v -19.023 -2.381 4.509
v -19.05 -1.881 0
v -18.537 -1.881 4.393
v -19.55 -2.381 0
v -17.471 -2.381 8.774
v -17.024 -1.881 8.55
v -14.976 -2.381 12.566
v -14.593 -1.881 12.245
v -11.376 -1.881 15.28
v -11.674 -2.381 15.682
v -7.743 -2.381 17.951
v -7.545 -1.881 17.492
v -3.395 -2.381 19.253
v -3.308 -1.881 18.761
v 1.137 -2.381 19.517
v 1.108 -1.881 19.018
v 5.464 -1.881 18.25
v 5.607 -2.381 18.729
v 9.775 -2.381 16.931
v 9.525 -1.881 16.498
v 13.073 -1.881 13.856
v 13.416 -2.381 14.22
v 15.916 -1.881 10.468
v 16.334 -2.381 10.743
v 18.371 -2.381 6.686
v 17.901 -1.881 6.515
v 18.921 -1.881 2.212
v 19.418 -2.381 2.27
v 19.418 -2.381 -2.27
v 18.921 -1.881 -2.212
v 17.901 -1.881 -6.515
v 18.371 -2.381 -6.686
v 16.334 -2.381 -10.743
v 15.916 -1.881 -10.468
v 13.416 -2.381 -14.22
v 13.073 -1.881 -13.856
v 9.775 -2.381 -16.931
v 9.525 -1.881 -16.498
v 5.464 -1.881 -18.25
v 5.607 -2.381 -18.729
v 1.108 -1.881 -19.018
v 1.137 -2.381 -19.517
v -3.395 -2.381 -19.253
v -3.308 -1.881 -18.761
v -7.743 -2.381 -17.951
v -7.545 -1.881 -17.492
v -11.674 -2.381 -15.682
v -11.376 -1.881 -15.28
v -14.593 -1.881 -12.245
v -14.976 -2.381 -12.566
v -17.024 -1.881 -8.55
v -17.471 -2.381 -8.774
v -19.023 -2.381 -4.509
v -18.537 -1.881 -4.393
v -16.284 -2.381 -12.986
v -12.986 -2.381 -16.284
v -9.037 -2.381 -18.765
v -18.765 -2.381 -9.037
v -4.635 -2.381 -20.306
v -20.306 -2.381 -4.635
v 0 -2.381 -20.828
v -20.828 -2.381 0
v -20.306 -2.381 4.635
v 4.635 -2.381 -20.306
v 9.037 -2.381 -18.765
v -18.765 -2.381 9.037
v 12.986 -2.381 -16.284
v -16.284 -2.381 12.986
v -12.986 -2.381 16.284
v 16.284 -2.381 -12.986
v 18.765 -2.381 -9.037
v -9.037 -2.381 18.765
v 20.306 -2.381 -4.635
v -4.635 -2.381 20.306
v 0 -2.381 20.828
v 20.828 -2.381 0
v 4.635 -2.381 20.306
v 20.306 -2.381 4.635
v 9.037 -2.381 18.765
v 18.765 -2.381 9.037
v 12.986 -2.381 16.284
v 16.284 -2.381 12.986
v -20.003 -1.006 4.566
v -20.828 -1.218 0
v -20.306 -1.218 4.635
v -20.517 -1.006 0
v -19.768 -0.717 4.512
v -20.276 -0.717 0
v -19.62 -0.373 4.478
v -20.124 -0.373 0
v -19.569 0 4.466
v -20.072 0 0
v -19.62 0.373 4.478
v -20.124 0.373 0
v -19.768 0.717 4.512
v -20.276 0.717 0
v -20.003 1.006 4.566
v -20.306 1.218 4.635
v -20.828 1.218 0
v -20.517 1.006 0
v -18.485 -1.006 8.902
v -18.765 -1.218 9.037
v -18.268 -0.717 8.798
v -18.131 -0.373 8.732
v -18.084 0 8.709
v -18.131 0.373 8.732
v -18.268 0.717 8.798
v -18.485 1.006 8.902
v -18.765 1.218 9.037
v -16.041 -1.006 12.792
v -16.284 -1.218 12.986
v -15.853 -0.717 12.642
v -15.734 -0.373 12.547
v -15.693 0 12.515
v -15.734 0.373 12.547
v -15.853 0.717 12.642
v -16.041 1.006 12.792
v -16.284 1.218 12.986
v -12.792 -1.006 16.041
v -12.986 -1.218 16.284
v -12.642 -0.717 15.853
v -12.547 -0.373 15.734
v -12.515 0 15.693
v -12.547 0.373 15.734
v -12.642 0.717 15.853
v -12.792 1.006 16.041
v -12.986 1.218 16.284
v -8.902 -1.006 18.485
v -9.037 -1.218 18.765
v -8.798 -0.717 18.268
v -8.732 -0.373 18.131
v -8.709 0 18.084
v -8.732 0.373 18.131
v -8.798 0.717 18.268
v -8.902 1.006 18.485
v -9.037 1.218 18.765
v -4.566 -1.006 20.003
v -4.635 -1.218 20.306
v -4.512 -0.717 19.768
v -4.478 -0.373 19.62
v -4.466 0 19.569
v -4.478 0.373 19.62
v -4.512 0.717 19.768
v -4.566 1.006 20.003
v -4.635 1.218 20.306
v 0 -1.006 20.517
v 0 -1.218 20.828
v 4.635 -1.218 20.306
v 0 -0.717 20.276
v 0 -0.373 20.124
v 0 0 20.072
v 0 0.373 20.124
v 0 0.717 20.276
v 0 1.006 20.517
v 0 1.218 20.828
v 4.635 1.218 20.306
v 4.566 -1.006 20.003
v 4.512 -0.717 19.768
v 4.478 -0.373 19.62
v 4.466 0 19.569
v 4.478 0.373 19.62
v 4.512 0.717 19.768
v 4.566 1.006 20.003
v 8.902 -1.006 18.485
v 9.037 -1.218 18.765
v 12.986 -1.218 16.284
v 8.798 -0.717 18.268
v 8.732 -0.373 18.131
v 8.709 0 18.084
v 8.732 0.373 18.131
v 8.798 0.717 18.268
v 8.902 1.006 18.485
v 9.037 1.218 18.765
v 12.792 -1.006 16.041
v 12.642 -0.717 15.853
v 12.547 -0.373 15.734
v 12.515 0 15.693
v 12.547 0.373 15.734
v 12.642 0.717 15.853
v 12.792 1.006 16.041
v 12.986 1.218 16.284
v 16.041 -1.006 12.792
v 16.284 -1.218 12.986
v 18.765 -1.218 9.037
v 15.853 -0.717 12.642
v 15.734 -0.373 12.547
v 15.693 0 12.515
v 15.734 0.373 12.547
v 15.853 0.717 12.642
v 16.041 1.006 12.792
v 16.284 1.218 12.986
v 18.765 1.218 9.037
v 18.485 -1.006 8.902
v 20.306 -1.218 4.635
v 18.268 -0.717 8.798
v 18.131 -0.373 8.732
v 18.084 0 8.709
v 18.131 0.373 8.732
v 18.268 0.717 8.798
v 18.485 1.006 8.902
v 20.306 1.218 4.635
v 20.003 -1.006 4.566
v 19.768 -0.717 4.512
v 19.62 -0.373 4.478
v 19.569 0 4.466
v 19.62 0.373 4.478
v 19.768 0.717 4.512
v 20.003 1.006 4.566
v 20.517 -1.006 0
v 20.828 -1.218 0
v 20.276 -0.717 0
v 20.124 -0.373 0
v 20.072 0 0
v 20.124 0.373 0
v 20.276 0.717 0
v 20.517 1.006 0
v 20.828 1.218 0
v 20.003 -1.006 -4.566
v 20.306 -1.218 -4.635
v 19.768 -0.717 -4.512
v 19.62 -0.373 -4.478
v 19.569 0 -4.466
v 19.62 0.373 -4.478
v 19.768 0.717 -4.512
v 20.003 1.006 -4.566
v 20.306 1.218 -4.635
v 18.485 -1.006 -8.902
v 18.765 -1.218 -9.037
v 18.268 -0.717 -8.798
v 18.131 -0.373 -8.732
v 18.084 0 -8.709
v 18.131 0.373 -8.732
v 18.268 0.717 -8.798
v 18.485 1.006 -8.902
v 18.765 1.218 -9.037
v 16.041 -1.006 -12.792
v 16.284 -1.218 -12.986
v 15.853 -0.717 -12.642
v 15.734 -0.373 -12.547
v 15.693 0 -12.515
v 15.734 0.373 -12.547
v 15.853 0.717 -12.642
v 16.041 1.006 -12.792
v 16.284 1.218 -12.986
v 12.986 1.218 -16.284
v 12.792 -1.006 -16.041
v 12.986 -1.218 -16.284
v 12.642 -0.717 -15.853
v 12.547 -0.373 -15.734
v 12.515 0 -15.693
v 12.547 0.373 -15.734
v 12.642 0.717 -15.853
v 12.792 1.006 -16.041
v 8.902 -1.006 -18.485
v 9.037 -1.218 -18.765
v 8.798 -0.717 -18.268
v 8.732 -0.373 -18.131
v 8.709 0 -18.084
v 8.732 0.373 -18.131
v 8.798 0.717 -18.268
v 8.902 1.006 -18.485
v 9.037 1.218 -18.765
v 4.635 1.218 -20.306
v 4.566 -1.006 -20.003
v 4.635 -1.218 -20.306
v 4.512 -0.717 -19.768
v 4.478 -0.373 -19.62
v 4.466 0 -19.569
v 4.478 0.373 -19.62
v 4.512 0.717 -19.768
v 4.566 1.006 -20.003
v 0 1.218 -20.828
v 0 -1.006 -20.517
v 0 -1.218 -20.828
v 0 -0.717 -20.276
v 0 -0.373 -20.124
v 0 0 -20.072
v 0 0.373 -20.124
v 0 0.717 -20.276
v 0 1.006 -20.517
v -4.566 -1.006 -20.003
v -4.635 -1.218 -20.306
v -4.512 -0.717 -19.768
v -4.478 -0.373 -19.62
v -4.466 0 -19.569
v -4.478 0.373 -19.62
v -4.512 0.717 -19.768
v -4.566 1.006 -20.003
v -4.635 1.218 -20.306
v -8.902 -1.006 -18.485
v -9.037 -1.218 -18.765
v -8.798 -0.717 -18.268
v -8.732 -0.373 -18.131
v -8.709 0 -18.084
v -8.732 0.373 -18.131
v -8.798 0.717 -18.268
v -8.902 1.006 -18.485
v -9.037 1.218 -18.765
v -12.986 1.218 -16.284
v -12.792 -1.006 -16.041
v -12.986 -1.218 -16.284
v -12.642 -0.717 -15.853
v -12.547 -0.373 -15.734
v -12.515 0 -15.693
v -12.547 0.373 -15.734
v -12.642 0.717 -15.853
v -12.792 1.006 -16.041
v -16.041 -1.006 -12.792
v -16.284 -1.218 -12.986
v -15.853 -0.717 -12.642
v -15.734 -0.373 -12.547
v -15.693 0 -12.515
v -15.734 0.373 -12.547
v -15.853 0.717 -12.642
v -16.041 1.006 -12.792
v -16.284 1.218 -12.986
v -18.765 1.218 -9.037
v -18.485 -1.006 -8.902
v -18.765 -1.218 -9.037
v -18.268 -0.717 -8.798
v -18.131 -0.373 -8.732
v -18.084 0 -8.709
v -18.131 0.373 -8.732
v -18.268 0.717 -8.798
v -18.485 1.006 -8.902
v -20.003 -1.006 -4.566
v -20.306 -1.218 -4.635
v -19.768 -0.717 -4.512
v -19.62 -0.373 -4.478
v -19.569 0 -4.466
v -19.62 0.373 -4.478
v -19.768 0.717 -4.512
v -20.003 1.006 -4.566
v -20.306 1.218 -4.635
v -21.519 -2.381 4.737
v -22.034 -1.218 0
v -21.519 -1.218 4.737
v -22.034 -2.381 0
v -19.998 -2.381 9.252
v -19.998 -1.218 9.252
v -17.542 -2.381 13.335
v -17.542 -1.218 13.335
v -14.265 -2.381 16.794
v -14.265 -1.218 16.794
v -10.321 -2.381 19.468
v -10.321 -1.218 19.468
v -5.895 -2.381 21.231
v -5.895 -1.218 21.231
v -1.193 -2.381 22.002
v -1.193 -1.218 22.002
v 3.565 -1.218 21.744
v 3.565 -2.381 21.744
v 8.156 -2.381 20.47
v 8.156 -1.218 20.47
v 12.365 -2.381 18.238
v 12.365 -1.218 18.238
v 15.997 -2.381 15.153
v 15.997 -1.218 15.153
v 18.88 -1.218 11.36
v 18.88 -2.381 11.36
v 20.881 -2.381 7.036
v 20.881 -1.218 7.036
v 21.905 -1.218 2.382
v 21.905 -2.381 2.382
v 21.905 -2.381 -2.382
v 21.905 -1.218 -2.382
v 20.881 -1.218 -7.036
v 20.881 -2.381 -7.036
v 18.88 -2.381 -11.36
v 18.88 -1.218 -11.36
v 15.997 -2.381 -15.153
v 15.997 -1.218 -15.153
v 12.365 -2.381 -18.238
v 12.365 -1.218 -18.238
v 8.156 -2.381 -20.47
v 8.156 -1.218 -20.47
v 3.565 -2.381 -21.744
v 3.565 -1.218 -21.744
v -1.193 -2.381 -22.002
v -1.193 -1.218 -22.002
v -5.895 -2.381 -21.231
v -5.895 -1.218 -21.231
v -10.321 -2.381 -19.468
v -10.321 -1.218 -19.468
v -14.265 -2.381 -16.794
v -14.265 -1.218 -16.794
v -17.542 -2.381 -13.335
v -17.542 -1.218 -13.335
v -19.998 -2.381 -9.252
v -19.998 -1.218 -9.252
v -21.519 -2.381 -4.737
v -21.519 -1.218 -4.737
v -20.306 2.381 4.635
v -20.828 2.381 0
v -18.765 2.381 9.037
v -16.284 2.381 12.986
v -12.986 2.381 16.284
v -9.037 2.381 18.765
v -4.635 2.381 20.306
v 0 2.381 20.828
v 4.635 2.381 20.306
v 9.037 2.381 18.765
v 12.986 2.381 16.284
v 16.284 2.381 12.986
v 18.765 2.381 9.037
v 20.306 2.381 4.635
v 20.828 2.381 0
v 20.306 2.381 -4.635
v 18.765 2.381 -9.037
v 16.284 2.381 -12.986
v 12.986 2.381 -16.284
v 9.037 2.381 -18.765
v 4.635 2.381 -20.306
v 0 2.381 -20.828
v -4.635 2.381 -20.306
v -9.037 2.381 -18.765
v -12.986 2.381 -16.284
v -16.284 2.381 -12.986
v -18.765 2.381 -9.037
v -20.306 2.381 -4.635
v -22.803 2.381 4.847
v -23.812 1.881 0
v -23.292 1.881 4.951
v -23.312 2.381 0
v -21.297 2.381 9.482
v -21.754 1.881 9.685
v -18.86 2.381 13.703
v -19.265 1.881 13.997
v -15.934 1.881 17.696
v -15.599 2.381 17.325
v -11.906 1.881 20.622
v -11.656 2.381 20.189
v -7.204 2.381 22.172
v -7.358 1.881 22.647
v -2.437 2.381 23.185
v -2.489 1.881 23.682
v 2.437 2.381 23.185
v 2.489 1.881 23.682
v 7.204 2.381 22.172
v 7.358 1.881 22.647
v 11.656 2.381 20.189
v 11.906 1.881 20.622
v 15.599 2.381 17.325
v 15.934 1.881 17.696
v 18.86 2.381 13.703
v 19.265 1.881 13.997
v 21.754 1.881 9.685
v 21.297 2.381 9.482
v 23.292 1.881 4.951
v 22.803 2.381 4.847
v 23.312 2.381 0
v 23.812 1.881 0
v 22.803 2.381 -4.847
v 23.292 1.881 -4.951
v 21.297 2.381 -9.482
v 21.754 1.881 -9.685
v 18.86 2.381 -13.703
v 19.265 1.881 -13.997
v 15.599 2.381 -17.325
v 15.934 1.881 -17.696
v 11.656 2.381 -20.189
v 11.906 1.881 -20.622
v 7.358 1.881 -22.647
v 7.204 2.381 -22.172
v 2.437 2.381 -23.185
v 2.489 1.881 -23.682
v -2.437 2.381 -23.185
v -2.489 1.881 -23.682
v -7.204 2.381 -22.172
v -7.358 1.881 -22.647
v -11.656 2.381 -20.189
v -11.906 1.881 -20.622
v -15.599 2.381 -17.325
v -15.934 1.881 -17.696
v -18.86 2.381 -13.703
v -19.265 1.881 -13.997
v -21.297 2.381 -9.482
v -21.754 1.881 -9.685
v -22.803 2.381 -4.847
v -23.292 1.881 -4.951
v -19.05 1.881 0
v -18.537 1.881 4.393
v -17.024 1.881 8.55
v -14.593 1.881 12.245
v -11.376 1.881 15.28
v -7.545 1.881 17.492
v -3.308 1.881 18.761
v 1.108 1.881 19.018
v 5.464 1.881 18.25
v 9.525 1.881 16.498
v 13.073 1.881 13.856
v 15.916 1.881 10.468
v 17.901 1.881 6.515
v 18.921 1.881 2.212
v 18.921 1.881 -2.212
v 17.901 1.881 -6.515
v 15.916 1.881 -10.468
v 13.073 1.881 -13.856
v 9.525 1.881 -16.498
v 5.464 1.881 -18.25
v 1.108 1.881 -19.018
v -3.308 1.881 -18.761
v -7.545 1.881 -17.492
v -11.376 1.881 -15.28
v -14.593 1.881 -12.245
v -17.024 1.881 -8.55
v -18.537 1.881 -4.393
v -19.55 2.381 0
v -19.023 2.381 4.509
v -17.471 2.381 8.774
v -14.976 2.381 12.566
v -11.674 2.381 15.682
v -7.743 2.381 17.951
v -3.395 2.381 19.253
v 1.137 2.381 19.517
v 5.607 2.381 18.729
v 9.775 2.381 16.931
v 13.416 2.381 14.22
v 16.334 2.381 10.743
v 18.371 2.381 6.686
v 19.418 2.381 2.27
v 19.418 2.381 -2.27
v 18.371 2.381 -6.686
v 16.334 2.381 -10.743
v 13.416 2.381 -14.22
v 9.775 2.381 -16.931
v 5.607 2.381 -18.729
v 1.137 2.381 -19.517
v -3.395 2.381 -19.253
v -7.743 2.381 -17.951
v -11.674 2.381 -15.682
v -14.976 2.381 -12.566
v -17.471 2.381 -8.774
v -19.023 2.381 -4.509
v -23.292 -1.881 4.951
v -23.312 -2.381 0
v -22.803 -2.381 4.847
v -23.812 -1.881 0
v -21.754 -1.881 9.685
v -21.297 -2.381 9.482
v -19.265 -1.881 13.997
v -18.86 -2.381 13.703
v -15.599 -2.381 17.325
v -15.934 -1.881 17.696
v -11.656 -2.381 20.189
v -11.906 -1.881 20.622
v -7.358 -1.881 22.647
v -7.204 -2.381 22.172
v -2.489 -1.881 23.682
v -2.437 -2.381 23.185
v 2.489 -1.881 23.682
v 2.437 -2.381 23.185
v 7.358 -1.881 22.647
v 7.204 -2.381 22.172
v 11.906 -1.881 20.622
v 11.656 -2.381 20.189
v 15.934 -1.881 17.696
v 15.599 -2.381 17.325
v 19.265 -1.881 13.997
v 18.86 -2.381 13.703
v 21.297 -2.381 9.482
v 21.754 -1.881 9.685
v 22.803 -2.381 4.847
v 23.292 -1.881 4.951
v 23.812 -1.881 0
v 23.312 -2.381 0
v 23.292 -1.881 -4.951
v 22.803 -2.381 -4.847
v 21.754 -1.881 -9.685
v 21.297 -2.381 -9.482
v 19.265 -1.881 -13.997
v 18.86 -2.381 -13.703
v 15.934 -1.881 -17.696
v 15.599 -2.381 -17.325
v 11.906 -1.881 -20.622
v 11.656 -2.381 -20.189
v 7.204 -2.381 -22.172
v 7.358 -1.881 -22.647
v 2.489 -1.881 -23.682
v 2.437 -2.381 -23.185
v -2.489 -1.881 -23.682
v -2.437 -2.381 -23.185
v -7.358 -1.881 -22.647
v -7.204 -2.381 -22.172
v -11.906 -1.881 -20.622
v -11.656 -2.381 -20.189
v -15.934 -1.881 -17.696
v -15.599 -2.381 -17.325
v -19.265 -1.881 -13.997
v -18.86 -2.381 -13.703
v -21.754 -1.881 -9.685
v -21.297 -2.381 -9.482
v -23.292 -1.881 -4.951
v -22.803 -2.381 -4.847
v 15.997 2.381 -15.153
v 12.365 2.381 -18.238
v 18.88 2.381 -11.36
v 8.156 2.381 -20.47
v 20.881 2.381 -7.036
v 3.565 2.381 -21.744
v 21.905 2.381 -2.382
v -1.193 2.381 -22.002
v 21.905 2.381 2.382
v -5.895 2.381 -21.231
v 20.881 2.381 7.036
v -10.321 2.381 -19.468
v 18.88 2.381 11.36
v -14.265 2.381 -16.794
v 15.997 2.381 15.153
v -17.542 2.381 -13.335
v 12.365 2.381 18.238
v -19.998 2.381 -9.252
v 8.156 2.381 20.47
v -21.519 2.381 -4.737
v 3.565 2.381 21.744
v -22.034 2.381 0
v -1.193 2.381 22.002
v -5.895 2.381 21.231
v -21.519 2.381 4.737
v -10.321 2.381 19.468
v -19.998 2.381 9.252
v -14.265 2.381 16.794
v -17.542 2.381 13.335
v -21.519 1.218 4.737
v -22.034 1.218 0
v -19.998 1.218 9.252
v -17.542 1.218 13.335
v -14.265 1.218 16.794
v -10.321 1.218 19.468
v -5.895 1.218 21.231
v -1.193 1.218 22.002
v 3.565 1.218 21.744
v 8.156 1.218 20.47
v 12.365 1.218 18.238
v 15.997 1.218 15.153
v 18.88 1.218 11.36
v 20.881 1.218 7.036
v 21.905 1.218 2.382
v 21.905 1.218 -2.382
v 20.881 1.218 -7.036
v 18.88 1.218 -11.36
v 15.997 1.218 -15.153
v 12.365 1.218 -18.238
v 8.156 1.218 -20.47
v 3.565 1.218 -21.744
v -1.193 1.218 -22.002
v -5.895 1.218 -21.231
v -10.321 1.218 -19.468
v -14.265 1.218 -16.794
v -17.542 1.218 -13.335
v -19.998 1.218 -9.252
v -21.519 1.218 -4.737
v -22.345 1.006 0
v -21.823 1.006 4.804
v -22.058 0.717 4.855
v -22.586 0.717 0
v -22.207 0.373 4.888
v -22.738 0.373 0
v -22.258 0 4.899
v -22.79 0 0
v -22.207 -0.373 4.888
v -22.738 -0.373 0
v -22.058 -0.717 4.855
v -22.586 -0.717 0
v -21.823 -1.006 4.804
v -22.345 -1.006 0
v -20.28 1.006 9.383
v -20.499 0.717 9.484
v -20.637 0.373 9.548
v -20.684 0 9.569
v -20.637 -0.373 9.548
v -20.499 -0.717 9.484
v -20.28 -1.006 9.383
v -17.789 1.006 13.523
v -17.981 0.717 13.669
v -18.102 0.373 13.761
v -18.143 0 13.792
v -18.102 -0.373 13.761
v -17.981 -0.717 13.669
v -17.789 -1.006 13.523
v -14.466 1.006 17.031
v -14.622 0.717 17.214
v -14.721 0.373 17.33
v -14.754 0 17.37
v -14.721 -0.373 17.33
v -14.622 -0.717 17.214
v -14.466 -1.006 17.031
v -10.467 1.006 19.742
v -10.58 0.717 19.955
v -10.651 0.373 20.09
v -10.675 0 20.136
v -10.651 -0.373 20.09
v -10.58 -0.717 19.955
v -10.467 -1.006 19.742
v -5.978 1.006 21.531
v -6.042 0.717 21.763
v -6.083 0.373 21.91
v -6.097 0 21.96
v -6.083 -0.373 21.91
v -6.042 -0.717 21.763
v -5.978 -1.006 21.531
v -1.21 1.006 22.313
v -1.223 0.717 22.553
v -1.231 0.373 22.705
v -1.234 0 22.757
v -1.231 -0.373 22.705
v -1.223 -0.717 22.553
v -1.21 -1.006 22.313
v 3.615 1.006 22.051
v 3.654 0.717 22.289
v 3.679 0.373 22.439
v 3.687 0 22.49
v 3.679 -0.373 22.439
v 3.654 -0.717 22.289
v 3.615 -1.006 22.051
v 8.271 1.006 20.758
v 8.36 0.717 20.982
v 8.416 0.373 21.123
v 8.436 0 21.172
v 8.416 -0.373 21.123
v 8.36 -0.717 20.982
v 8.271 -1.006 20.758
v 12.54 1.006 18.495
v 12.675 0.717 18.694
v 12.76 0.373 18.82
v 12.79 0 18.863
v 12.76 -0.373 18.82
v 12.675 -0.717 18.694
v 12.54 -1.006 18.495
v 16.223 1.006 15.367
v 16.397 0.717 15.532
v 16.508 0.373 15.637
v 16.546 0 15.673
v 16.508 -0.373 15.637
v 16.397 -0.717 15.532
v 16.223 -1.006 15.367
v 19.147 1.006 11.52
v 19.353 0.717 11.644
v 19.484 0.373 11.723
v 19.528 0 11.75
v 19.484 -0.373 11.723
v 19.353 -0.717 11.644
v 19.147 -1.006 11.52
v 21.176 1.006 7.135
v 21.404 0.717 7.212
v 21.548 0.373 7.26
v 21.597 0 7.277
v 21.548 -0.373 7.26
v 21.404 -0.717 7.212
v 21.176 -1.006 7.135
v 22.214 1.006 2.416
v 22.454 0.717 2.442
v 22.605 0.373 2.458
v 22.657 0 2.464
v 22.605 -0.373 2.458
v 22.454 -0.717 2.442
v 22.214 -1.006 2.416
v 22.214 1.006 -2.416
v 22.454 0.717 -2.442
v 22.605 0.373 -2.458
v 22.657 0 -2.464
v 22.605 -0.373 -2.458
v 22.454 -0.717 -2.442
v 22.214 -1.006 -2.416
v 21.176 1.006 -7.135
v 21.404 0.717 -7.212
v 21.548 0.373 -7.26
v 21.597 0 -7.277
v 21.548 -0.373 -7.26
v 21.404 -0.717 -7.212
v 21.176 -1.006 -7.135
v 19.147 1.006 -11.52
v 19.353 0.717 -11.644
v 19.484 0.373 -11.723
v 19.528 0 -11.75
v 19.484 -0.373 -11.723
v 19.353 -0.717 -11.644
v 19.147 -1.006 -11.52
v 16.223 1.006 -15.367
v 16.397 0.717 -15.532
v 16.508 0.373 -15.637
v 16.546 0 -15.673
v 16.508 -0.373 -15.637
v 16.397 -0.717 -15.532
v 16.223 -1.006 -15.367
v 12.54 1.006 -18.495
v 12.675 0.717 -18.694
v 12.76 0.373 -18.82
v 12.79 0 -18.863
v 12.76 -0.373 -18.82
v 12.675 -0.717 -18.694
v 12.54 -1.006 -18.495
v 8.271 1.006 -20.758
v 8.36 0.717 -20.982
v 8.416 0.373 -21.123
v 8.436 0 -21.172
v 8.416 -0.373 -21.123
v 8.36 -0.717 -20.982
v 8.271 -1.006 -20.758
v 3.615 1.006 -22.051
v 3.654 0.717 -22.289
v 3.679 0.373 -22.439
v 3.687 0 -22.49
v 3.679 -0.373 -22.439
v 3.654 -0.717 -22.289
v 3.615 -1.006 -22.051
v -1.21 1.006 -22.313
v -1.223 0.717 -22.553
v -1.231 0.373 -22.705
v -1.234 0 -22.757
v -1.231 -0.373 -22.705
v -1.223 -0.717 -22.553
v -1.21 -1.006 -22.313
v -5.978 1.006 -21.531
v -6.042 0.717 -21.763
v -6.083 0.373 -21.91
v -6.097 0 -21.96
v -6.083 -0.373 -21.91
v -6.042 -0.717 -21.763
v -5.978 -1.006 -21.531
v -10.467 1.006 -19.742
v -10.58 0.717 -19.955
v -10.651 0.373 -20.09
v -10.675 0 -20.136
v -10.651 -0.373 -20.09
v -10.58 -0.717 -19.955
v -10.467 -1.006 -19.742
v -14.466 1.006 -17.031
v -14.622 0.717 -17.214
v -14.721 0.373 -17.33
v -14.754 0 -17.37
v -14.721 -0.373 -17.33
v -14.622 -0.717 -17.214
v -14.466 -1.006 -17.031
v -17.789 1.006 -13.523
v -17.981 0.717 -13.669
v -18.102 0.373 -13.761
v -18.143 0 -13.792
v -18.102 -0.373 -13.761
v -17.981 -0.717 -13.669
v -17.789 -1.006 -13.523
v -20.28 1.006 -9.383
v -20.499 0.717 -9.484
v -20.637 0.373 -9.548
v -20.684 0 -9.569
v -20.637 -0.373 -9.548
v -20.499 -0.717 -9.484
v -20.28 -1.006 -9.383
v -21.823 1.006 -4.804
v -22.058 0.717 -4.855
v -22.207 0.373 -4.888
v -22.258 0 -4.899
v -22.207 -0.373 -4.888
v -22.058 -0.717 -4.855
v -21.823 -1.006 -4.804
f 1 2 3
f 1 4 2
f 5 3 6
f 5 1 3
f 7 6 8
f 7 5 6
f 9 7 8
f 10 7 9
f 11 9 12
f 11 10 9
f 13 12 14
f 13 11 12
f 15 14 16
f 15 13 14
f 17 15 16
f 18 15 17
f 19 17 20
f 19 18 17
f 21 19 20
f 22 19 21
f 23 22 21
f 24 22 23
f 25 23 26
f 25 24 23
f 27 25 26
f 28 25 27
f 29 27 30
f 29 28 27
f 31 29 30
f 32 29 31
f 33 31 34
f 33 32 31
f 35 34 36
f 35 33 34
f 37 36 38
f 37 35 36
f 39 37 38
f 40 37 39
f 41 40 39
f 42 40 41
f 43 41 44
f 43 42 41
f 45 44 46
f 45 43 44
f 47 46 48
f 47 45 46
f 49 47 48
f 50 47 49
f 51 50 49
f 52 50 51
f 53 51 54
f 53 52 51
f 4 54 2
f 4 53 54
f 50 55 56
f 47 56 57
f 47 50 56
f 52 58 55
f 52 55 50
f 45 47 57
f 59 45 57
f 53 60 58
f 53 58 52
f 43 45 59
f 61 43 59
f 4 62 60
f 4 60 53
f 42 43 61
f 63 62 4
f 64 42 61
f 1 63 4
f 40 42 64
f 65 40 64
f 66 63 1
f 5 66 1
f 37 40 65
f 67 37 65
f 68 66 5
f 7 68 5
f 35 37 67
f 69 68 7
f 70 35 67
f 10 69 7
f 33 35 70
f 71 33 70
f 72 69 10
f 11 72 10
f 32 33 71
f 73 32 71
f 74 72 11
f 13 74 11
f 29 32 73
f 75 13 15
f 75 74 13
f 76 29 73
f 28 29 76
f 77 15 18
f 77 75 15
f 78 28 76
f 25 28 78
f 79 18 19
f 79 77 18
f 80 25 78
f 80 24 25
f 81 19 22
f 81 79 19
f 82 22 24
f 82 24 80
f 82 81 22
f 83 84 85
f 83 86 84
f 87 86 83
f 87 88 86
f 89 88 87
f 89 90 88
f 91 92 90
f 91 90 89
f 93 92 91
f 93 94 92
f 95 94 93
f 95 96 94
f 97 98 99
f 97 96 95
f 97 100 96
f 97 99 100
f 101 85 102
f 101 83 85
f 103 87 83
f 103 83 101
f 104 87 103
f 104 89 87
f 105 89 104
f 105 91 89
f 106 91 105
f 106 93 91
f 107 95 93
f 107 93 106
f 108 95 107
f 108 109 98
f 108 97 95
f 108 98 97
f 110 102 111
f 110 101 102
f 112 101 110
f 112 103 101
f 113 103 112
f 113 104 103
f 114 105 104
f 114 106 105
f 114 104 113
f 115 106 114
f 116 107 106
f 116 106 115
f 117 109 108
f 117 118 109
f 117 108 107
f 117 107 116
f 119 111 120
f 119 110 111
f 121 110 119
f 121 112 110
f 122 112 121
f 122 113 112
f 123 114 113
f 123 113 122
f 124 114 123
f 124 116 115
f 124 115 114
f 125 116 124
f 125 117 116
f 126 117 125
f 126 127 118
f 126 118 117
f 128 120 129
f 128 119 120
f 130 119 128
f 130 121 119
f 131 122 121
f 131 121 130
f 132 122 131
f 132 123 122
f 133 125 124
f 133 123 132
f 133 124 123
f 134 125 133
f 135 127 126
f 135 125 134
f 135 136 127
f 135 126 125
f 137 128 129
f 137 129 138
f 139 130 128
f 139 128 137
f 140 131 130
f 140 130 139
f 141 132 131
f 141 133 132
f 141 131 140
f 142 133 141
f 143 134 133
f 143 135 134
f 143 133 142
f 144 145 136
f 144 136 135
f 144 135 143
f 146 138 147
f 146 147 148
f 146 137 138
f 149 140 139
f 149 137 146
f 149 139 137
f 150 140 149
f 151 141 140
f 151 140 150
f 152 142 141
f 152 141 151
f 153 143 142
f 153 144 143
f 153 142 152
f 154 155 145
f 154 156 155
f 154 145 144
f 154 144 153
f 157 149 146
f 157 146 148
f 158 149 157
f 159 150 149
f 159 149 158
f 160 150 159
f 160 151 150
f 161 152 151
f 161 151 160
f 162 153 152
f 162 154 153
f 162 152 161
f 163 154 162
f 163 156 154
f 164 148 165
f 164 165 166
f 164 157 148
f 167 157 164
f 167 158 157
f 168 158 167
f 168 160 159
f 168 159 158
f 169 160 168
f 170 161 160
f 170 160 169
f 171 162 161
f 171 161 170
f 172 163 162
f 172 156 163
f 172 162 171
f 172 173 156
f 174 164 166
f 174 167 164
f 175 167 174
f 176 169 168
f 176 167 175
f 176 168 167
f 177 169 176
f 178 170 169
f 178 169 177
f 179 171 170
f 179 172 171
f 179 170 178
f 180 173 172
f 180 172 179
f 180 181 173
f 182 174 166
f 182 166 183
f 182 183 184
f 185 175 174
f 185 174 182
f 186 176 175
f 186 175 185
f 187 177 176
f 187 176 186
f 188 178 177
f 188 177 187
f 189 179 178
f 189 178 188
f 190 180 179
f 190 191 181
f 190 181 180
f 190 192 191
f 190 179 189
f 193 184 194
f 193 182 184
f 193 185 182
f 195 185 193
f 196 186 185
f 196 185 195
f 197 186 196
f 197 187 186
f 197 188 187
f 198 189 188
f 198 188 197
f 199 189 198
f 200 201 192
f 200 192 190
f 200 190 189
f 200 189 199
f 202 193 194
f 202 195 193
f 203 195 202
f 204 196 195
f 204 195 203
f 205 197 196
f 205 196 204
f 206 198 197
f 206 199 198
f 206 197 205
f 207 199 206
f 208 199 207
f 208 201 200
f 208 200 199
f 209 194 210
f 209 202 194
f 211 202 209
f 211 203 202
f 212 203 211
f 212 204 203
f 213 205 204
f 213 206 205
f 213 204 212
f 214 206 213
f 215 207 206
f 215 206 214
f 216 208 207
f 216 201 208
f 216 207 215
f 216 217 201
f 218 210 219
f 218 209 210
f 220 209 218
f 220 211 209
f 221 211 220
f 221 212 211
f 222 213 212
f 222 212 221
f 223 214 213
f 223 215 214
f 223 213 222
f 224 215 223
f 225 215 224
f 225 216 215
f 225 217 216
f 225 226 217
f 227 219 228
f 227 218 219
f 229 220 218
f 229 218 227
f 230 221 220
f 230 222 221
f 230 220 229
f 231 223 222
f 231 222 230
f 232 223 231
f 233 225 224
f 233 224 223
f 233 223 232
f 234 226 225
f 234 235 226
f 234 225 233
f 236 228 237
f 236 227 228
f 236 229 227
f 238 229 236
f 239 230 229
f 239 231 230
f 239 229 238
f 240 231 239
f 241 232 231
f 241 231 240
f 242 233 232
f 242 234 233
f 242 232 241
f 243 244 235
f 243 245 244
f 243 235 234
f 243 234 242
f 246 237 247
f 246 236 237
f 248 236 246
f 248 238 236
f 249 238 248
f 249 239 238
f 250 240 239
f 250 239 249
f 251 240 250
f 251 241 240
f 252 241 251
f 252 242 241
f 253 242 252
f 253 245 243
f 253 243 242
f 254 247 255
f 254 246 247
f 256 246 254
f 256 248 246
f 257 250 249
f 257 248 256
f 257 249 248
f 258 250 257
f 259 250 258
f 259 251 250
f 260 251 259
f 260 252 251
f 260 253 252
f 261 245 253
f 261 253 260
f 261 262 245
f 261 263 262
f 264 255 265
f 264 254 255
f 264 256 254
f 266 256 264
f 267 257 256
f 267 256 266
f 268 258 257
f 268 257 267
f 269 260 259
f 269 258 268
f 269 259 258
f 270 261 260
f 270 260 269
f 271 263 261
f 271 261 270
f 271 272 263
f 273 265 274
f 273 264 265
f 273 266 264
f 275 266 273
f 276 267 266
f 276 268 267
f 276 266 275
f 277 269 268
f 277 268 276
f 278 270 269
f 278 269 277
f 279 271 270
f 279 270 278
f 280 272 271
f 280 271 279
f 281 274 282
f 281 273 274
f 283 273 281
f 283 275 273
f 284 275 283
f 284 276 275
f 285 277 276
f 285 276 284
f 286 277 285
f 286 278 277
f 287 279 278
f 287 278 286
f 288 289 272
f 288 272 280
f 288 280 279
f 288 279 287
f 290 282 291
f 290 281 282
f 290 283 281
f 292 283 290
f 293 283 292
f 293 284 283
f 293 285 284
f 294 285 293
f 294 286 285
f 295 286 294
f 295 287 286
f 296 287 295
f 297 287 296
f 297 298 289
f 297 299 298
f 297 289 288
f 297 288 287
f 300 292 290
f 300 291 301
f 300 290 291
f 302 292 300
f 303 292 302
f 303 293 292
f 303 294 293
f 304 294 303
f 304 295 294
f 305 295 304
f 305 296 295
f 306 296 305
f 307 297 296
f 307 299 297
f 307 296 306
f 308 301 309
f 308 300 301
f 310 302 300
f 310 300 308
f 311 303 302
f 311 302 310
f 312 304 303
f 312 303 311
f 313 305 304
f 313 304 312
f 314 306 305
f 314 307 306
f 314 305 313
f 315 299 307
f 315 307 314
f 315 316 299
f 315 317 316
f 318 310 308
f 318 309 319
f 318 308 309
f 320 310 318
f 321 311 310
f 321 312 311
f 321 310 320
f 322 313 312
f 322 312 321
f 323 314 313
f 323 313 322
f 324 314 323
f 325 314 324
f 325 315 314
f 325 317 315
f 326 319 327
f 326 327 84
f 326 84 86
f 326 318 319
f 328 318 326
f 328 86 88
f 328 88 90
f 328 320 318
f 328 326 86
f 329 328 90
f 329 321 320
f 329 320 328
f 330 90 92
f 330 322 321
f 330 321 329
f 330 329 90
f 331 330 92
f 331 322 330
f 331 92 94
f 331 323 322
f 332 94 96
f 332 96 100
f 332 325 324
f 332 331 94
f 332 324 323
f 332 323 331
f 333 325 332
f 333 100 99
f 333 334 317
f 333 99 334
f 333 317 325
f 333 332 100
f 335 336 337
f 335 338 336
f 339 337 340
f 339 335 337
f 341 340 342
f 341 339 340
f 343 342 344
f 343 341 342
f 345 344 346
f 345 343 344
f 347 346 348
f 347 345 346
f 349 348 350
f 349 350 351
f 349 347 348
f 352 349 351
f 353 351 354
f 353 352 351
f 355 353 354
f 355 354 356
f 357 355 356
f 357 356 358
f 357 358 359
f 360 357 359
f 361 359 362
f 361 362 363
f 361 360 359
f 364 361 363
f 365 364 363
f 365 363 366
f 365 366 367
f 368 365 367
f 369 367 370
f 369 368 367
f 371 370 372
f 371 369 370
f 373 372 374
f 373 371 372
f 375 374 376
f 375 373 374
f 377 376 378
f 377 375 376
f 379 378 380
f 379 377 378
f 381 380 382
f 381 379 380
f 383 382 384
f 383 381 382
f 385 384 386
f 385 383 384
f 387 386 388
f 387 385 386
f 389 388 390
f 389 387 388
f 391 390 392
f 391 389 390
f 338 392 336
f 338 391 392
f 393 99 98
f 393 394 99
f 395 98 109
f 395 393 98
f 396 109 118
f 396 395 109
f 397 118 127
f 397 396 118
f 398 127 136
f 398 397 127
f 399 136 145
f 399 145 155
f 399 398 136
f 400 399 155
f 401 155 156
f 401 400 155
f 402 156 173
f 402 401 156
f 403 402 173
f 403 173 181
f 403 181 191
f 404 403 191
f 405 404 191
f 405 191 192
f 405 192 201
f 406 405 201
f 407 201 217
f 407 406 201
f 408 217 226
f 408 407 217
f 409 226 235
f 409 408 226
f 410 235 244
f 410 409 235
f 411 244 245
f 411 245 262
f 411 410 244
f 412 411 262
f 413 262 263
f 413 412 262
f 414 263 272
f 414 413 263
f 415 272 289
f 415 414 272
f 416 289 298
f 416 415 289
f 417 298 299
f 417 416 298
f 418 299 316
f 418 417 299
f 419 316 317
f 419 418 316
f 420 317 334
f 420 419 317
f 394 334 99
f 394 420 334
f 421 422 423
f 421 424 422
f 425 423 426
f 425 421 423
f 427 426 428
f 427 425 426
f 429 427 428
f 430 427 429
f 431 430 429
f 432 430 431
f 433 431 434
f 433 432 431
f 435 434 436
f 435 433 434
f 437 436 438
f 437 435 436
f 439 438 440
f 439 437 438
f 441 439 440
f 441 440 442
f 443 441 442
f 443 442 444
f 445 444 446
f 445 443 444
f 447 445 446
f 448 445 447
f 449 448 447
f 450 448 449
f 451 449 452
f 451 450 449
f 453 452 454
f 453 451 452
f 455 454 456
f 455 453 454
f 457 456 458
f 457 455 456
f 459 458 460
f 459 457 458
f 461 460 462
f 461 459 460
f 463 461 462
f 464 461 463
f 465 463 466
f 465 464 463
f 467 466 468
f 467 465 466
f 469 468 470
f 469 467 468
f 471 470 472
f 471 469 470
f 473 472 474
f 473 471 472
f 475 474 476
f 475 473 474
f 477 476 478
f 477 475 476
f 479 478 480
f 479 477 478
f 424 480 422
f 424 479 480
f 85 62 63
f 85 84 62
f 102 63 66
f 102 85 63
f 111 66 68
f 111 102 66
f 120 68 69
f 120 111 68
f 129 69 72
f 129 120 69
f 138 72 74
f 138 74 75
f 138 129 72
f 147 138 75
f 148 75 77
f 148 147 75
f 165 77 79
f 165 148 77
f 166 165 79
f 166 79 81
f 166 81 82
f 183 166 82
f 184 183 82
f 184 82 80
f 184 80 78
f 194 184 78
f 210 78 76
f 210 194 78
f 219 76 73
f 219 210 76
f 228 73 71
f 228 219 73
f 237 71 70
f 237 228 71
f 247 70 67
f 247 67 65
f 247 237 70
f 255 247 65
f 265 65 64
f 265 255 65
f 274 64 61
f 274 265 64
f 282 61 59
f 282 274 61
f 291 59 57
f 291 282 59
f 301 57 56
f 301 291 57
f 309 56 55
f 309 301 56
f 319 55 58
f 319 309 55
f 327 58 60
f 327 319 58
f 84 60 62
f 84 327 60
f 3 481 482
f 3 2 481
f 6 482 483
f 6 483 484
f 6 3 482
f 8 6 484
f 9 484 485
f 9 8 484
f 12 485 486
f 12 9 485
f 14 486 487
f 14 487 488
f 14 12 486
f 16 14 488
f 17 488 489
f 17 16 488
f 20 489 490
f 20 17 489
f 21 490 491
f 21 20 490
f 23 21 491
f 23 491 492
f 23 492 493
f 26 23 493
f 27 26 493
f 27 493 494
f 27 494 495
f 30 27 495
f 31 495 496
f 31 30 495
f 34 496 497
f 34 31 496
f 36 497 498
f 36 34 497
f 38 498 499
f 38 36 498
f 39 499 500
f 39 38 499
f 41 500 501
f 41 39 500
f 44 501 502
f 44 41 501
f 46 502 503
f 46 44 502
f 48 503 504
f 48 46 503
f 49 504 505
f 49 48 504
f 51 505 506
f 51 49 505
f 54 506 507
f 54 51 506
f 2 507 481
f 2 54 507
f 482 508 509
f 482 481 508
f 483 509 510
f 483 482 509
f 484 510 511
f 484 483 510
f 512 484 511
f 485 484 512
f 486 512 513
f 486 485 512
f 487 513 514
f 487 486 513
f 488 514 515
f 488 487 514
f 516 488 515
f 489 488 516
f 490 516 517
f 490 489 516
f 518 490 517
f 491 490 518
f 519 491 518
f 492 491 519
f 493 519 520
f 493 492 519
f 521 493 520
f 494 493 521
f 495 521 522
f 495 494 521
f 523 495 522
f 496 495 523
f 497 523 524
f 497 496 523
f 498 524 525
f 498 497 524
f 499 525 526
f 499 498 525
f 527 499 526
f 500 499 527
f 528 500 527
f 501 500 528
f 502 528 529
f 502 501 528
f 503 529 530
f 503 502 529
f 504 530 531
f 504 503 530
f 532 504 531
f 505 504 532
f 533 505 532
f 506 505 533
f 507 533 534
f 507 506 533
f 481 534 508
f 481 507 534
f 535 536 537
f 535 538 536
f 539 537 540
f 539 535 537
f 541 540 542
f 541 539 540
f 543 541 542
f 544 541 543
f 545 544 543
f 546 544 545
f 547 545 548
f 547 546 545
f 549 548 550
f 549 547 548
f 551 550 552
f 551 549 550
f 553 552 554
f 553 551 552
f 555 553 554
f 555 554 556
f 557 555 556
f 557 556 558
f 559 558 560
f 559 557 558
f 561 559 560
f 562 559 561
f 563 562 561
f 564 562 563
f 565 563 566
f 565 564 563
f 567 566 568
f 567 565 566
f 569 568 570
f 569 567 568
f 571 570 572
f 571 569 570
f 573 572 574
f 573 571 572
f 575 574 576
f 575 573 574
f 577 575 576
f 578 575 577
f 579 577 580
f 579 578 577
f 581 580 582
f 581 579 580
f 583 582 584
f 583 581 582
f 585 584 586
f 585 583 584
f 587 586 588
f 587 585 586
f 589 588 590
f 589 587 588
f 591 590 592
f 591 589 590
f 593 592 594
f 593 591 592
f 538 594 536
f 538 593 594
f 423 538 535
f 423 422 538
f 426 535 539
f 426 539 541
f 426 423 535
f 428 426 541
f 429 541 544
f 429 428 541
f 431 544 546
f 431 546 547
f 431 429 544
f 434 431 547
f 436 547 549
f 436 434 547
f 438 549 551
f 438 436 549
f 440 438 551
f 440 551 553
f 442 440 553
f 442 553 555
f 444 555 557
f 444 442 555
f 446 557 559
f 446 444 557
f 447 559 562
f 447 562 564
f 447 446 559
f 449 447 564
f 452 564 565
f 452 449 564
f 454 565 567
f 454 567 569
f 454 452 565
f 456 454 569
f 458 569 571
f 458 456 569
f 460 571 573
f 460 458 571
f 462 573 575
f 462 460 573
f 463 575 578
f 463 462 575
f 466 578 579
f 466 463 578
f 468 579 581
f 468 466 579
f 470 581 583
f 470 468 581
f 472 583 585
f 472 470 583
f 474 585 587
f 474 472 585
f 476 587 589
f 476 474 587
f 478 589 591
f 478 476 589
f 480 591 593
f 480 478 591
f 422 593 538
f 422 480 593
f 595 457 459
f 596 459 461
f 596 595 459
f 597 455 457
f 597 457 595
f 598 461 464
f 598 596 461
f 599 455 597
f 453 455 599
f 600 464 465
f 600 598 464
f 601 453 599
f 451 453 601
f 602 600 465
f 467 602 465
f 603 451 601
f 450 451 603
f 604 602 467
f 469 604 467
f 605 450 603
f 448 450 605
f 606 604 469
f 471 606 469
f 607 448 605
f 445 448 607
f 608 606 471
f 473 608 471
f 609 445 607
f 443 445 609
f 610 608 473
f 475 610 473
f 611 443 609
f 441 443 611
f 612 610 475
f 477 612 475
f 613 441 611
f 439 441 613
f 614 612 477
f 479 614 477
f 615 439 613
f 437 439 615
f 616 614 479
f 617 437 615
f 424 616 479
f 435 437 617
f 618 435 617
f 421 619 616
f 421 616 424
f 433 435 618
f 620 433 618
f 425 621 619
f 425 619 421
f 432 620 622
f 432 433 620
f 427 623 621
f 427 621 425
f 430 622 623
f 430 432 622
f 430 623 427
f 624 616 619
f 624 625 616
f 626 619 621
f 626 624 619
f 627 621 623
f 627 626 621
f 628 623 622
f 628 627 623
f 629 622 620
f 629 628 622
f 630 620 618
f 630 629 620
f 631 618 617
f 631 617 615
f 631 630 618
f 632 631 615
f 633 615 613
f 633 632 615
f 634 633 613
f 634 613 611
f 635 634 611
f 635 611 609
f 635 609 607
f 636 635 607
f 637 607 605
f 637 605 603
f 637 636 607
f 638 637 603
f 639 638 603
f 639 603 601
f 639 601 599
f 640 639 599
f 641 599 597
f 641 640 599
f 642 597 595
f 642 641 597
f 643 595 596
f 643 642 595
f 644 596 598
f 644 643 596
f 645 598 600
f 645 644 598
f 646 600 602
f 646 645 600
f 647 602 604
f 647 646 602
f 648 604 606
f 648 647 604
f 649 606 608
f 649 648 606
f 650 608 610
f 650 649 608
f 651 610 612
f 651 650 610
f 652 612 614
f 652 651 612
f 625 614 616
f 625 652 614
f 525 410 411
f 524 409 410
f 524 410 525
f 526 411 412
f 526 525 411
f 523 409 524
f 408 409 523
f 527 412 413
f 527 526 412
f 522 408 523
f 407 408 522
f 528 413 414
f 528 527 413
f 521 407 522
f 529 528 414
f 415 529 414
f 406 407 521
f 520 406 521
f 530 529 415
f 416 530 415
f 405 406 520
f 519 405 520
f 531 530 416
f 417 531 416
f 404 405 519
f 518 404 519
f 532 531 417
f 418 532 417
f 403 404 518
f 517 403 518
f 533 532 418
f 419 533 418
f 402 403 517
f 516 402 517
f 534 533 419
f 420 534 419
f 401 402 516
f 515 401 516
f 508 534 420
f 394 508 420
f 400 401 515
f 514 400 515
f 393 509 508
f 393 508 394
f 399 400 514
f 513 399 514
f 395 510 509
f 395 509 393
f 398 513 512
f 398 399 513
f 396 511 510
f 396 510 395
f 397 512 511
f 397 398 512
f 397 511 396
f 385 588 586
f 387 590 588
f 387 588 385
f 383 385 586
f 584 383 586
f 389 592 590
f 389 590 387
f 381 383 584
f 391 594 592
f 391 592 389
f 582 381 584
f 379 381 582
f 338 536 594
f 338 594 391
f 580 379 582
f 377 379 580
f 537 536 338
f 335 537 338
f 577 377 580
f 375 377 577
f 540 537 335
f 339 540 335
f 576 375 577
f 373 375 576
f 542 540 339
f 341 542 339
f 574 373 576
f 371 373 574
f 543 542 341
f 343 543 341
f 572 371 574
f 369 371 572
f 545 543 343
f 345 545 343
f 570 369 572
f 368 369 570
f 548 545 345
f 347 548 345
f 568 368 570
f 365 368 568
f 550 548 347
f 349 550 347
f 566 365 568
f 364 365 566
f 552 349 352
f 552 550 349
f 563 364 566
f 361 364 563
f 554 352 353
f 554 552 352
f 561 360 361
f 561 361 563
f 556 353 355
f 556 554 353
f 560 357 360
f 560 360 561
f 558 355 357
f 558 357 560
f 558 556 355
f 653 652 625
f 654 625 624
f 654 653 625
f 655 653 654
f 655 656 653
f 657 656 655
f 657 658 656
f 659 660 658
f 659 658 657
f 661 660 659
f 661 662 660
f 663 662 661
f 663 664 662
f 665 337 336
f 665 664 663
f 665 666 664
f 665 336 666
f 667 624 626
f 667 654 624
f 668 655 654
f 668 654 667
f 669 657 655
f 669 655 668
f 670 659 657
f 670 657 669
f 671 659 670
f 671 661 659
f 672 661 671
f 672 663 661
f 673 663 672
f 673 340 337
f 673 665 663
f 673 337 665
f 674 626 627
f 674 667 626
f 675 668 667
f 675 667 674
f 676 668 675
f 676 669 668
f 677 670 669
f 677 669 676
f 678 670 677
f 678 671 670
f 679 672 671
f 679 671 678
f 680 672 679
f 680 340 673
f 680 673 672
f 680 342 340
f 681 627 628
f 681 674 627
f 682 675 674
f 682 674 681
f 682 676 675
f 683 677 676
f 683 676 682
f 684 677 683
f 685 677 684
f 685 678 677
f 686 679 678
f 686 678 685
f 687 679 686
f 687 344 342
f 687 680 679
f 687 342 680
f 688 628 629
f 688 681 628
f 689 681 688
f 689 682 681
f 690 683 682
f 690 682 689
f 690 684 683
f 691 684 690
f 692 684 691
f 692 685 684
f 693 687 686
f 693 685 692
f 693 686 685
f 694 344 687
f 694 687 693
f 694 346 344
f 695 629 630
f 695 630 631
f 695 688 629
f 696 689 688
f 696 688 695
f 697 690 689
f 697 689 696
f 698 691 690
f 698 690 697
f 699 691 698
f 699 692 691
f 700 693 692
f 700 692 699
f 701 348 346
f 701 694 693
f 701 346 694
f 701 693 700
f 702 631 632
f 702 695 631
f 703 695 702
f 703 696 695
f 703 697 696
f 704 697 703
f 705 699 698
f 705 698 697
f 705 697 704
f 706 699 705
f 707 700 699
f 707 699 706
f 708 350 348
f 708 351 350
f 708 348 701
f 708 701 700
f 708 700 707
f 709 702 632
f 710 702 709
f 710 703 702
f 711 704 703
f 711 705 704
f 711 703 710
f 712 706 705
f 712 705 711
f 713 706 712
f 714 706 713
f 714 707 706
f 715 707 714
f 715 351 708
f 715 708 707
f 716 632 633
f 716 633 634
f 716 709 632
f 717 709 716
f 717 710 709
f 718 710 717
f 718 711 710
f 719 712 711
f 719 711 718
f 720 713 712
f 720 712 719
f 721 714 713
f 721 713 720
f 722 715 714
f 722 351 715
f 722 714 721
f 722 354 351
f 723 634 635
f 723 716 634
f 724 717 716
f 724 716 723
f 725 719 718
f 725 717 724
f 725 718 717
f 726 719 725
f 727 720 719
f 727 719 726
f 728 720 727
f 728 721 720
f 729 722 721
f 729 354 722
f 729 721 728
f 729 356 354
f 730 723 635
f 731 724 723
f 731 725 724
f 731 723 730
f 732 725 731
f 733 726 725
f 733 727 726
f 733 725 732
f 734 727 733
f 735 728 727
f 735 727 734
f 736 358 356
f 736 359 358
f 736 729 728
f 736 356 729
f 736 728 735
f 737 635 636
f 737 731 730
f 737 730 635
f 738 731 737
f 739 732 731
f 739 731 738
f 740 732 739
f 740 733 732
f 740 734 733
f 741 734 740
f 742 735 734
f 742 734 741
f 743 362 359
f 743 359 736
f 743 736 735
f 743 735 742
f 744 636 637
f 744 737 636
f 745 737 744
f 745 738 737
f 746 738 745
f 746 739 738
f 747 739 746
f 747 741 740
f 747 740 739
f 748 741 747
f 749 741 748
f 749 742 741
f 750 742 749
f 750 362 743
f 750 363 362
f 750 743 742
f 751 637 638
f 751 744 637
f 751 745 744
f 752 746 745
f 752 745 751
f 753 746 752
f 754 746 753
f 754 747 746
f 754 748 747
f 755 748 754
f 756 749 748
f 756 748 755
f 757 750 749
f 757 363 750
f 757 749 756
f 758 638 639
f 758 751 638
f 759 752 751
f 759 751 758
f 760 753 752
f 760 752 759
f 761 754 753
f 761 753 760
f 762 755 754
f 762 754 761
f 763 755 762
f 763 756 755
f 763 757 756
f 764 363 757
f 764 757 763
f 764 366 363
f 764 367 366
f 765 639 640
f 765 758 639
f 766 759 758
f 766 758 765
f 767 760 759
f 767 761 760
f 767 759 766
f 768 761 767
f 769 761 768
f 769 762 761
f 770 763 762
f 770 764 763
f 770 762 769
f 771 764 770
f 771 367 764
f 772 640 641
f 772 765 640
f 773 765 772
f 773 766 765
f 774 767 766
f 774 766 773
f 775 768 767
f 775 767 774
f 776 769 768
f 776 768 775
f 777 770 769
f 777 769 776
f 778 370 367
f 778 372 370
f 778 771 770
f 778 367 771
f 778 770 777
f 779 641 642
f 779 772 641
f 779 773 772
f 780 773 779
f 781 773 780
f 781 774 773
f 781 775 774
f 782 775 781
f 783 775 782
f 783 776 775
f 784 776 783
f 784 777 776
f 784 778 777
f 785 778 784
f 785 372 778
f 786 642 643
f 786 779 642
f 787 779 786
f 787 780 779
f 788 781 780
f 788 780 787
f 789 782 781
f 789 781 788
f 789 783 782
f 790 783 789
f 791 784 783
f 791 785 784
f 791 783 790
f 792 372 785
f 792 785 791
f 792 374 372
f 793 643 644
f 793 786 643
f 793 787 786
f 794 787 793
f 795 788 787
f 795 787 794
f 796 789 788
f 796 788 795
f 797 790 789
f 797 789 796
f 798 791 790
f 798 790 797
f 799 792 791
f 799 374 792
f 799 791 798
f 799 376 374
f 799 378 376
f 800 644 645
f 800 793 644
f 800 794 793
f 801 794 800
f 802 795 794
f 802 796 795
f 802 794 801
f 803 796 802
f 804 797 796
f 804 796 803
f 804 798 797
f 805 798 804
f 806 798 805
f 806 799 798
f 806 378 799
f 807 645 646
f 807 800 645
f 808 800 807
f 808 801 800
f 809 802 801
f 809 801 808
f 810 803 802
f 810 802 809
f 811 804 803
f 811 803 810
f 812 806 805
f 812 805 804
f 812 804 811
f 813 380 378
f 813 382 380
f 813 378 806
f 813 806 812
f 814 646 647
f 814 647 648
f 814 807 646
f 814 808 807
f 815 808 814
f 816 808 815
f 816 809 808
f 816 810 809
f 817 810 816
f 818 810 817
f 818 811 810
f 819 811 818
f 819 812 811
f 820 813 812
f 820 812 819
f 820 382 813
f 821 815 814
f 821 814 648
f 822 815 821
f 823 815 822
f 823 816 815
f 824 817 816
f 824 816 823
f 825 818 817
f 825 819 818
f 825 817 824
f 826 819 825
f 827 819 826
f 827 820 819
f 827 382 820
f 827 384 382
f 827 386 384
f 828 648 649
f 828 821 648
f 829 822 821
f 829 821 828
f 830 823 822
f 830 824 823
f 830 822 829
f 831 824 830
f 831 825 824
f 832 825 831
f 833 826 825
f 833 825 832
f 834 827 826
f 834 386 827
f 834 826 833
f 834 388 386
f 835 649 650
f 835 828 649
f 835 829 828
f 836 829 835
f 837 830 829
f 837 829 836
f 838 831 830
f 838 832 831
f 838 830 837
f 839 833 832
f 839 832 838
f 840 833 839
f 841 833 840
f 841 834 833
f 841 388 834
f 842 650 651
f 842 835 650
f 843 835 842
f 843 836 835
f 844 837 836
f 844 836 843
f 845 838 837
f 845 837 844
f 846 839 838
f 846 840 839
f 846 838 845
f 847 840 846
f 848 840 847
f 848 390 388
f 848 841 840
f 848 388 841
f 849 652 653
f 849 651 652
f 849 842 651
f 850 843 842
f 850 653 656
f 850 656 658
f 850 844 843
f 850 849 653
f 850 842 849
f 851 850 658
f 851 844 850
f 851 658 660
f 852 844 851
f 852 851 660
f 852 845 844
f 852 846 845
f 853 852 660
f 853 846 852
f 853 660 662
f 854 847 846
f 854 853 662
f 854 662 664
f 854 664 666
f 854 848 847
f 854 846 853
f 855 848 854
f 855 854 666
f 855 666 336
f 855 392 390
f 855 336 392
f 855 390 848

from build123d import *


with BuildPart() as part:
    # Sketch1 → Revolve1 (revolve)
    with BuildSketch(Plane.XY):
        with BuildLine():
            Line((-23.8125, -1.88125), (-23.8125, 1.88125))
            Line((-23.8125, 1.88125), (-23.3125, 2.38125))
            Line((-23.3125, 2.38125), (-22.0345, 2.38125))
            Line((-22.0345, 2.38125), (-22.0345, 1.217995801))
            ThreePointArc((-22.0345, 1.217995801), (-22.790449887, 0), (-22.0345, -1.217995801))
            Line((-22.0345, -1.217995801), (-22.0345, -2.38125))
            Line((-22.0345, -2.38125), (-23.3125, -2.38125))
            Line((-23.3125, -2.38125), (-23.8125, -1.88125))
        make_face()
        with BuildLine():
            Line((-19.05, -1.88125), (-19.55, -2.38125))
            Line((-19.55, -2.38125), (-20.828, -2.38125))
            Line((-20.828, -2.38125), (-20.828, -1.217995801))
            ThreePointArc((-20.828, -1.217995801), (-20.072050113, 0), (-20.828, 1.217995801))
            Line((-20.828, 1.217995801), (-20.828, 2.38125))
            Line((-20.828, 2.38125), (-19.55, 2.38125))
            Line((-19.55, 2.38125), (-19.05, 1.88125))
            Line((-19.05, 1.88125), (-19.05, -1.88125))
        make_face()
    revolve(axis=Axis((0, 0, 0), (0, 1, 0)))


solid = part.part
